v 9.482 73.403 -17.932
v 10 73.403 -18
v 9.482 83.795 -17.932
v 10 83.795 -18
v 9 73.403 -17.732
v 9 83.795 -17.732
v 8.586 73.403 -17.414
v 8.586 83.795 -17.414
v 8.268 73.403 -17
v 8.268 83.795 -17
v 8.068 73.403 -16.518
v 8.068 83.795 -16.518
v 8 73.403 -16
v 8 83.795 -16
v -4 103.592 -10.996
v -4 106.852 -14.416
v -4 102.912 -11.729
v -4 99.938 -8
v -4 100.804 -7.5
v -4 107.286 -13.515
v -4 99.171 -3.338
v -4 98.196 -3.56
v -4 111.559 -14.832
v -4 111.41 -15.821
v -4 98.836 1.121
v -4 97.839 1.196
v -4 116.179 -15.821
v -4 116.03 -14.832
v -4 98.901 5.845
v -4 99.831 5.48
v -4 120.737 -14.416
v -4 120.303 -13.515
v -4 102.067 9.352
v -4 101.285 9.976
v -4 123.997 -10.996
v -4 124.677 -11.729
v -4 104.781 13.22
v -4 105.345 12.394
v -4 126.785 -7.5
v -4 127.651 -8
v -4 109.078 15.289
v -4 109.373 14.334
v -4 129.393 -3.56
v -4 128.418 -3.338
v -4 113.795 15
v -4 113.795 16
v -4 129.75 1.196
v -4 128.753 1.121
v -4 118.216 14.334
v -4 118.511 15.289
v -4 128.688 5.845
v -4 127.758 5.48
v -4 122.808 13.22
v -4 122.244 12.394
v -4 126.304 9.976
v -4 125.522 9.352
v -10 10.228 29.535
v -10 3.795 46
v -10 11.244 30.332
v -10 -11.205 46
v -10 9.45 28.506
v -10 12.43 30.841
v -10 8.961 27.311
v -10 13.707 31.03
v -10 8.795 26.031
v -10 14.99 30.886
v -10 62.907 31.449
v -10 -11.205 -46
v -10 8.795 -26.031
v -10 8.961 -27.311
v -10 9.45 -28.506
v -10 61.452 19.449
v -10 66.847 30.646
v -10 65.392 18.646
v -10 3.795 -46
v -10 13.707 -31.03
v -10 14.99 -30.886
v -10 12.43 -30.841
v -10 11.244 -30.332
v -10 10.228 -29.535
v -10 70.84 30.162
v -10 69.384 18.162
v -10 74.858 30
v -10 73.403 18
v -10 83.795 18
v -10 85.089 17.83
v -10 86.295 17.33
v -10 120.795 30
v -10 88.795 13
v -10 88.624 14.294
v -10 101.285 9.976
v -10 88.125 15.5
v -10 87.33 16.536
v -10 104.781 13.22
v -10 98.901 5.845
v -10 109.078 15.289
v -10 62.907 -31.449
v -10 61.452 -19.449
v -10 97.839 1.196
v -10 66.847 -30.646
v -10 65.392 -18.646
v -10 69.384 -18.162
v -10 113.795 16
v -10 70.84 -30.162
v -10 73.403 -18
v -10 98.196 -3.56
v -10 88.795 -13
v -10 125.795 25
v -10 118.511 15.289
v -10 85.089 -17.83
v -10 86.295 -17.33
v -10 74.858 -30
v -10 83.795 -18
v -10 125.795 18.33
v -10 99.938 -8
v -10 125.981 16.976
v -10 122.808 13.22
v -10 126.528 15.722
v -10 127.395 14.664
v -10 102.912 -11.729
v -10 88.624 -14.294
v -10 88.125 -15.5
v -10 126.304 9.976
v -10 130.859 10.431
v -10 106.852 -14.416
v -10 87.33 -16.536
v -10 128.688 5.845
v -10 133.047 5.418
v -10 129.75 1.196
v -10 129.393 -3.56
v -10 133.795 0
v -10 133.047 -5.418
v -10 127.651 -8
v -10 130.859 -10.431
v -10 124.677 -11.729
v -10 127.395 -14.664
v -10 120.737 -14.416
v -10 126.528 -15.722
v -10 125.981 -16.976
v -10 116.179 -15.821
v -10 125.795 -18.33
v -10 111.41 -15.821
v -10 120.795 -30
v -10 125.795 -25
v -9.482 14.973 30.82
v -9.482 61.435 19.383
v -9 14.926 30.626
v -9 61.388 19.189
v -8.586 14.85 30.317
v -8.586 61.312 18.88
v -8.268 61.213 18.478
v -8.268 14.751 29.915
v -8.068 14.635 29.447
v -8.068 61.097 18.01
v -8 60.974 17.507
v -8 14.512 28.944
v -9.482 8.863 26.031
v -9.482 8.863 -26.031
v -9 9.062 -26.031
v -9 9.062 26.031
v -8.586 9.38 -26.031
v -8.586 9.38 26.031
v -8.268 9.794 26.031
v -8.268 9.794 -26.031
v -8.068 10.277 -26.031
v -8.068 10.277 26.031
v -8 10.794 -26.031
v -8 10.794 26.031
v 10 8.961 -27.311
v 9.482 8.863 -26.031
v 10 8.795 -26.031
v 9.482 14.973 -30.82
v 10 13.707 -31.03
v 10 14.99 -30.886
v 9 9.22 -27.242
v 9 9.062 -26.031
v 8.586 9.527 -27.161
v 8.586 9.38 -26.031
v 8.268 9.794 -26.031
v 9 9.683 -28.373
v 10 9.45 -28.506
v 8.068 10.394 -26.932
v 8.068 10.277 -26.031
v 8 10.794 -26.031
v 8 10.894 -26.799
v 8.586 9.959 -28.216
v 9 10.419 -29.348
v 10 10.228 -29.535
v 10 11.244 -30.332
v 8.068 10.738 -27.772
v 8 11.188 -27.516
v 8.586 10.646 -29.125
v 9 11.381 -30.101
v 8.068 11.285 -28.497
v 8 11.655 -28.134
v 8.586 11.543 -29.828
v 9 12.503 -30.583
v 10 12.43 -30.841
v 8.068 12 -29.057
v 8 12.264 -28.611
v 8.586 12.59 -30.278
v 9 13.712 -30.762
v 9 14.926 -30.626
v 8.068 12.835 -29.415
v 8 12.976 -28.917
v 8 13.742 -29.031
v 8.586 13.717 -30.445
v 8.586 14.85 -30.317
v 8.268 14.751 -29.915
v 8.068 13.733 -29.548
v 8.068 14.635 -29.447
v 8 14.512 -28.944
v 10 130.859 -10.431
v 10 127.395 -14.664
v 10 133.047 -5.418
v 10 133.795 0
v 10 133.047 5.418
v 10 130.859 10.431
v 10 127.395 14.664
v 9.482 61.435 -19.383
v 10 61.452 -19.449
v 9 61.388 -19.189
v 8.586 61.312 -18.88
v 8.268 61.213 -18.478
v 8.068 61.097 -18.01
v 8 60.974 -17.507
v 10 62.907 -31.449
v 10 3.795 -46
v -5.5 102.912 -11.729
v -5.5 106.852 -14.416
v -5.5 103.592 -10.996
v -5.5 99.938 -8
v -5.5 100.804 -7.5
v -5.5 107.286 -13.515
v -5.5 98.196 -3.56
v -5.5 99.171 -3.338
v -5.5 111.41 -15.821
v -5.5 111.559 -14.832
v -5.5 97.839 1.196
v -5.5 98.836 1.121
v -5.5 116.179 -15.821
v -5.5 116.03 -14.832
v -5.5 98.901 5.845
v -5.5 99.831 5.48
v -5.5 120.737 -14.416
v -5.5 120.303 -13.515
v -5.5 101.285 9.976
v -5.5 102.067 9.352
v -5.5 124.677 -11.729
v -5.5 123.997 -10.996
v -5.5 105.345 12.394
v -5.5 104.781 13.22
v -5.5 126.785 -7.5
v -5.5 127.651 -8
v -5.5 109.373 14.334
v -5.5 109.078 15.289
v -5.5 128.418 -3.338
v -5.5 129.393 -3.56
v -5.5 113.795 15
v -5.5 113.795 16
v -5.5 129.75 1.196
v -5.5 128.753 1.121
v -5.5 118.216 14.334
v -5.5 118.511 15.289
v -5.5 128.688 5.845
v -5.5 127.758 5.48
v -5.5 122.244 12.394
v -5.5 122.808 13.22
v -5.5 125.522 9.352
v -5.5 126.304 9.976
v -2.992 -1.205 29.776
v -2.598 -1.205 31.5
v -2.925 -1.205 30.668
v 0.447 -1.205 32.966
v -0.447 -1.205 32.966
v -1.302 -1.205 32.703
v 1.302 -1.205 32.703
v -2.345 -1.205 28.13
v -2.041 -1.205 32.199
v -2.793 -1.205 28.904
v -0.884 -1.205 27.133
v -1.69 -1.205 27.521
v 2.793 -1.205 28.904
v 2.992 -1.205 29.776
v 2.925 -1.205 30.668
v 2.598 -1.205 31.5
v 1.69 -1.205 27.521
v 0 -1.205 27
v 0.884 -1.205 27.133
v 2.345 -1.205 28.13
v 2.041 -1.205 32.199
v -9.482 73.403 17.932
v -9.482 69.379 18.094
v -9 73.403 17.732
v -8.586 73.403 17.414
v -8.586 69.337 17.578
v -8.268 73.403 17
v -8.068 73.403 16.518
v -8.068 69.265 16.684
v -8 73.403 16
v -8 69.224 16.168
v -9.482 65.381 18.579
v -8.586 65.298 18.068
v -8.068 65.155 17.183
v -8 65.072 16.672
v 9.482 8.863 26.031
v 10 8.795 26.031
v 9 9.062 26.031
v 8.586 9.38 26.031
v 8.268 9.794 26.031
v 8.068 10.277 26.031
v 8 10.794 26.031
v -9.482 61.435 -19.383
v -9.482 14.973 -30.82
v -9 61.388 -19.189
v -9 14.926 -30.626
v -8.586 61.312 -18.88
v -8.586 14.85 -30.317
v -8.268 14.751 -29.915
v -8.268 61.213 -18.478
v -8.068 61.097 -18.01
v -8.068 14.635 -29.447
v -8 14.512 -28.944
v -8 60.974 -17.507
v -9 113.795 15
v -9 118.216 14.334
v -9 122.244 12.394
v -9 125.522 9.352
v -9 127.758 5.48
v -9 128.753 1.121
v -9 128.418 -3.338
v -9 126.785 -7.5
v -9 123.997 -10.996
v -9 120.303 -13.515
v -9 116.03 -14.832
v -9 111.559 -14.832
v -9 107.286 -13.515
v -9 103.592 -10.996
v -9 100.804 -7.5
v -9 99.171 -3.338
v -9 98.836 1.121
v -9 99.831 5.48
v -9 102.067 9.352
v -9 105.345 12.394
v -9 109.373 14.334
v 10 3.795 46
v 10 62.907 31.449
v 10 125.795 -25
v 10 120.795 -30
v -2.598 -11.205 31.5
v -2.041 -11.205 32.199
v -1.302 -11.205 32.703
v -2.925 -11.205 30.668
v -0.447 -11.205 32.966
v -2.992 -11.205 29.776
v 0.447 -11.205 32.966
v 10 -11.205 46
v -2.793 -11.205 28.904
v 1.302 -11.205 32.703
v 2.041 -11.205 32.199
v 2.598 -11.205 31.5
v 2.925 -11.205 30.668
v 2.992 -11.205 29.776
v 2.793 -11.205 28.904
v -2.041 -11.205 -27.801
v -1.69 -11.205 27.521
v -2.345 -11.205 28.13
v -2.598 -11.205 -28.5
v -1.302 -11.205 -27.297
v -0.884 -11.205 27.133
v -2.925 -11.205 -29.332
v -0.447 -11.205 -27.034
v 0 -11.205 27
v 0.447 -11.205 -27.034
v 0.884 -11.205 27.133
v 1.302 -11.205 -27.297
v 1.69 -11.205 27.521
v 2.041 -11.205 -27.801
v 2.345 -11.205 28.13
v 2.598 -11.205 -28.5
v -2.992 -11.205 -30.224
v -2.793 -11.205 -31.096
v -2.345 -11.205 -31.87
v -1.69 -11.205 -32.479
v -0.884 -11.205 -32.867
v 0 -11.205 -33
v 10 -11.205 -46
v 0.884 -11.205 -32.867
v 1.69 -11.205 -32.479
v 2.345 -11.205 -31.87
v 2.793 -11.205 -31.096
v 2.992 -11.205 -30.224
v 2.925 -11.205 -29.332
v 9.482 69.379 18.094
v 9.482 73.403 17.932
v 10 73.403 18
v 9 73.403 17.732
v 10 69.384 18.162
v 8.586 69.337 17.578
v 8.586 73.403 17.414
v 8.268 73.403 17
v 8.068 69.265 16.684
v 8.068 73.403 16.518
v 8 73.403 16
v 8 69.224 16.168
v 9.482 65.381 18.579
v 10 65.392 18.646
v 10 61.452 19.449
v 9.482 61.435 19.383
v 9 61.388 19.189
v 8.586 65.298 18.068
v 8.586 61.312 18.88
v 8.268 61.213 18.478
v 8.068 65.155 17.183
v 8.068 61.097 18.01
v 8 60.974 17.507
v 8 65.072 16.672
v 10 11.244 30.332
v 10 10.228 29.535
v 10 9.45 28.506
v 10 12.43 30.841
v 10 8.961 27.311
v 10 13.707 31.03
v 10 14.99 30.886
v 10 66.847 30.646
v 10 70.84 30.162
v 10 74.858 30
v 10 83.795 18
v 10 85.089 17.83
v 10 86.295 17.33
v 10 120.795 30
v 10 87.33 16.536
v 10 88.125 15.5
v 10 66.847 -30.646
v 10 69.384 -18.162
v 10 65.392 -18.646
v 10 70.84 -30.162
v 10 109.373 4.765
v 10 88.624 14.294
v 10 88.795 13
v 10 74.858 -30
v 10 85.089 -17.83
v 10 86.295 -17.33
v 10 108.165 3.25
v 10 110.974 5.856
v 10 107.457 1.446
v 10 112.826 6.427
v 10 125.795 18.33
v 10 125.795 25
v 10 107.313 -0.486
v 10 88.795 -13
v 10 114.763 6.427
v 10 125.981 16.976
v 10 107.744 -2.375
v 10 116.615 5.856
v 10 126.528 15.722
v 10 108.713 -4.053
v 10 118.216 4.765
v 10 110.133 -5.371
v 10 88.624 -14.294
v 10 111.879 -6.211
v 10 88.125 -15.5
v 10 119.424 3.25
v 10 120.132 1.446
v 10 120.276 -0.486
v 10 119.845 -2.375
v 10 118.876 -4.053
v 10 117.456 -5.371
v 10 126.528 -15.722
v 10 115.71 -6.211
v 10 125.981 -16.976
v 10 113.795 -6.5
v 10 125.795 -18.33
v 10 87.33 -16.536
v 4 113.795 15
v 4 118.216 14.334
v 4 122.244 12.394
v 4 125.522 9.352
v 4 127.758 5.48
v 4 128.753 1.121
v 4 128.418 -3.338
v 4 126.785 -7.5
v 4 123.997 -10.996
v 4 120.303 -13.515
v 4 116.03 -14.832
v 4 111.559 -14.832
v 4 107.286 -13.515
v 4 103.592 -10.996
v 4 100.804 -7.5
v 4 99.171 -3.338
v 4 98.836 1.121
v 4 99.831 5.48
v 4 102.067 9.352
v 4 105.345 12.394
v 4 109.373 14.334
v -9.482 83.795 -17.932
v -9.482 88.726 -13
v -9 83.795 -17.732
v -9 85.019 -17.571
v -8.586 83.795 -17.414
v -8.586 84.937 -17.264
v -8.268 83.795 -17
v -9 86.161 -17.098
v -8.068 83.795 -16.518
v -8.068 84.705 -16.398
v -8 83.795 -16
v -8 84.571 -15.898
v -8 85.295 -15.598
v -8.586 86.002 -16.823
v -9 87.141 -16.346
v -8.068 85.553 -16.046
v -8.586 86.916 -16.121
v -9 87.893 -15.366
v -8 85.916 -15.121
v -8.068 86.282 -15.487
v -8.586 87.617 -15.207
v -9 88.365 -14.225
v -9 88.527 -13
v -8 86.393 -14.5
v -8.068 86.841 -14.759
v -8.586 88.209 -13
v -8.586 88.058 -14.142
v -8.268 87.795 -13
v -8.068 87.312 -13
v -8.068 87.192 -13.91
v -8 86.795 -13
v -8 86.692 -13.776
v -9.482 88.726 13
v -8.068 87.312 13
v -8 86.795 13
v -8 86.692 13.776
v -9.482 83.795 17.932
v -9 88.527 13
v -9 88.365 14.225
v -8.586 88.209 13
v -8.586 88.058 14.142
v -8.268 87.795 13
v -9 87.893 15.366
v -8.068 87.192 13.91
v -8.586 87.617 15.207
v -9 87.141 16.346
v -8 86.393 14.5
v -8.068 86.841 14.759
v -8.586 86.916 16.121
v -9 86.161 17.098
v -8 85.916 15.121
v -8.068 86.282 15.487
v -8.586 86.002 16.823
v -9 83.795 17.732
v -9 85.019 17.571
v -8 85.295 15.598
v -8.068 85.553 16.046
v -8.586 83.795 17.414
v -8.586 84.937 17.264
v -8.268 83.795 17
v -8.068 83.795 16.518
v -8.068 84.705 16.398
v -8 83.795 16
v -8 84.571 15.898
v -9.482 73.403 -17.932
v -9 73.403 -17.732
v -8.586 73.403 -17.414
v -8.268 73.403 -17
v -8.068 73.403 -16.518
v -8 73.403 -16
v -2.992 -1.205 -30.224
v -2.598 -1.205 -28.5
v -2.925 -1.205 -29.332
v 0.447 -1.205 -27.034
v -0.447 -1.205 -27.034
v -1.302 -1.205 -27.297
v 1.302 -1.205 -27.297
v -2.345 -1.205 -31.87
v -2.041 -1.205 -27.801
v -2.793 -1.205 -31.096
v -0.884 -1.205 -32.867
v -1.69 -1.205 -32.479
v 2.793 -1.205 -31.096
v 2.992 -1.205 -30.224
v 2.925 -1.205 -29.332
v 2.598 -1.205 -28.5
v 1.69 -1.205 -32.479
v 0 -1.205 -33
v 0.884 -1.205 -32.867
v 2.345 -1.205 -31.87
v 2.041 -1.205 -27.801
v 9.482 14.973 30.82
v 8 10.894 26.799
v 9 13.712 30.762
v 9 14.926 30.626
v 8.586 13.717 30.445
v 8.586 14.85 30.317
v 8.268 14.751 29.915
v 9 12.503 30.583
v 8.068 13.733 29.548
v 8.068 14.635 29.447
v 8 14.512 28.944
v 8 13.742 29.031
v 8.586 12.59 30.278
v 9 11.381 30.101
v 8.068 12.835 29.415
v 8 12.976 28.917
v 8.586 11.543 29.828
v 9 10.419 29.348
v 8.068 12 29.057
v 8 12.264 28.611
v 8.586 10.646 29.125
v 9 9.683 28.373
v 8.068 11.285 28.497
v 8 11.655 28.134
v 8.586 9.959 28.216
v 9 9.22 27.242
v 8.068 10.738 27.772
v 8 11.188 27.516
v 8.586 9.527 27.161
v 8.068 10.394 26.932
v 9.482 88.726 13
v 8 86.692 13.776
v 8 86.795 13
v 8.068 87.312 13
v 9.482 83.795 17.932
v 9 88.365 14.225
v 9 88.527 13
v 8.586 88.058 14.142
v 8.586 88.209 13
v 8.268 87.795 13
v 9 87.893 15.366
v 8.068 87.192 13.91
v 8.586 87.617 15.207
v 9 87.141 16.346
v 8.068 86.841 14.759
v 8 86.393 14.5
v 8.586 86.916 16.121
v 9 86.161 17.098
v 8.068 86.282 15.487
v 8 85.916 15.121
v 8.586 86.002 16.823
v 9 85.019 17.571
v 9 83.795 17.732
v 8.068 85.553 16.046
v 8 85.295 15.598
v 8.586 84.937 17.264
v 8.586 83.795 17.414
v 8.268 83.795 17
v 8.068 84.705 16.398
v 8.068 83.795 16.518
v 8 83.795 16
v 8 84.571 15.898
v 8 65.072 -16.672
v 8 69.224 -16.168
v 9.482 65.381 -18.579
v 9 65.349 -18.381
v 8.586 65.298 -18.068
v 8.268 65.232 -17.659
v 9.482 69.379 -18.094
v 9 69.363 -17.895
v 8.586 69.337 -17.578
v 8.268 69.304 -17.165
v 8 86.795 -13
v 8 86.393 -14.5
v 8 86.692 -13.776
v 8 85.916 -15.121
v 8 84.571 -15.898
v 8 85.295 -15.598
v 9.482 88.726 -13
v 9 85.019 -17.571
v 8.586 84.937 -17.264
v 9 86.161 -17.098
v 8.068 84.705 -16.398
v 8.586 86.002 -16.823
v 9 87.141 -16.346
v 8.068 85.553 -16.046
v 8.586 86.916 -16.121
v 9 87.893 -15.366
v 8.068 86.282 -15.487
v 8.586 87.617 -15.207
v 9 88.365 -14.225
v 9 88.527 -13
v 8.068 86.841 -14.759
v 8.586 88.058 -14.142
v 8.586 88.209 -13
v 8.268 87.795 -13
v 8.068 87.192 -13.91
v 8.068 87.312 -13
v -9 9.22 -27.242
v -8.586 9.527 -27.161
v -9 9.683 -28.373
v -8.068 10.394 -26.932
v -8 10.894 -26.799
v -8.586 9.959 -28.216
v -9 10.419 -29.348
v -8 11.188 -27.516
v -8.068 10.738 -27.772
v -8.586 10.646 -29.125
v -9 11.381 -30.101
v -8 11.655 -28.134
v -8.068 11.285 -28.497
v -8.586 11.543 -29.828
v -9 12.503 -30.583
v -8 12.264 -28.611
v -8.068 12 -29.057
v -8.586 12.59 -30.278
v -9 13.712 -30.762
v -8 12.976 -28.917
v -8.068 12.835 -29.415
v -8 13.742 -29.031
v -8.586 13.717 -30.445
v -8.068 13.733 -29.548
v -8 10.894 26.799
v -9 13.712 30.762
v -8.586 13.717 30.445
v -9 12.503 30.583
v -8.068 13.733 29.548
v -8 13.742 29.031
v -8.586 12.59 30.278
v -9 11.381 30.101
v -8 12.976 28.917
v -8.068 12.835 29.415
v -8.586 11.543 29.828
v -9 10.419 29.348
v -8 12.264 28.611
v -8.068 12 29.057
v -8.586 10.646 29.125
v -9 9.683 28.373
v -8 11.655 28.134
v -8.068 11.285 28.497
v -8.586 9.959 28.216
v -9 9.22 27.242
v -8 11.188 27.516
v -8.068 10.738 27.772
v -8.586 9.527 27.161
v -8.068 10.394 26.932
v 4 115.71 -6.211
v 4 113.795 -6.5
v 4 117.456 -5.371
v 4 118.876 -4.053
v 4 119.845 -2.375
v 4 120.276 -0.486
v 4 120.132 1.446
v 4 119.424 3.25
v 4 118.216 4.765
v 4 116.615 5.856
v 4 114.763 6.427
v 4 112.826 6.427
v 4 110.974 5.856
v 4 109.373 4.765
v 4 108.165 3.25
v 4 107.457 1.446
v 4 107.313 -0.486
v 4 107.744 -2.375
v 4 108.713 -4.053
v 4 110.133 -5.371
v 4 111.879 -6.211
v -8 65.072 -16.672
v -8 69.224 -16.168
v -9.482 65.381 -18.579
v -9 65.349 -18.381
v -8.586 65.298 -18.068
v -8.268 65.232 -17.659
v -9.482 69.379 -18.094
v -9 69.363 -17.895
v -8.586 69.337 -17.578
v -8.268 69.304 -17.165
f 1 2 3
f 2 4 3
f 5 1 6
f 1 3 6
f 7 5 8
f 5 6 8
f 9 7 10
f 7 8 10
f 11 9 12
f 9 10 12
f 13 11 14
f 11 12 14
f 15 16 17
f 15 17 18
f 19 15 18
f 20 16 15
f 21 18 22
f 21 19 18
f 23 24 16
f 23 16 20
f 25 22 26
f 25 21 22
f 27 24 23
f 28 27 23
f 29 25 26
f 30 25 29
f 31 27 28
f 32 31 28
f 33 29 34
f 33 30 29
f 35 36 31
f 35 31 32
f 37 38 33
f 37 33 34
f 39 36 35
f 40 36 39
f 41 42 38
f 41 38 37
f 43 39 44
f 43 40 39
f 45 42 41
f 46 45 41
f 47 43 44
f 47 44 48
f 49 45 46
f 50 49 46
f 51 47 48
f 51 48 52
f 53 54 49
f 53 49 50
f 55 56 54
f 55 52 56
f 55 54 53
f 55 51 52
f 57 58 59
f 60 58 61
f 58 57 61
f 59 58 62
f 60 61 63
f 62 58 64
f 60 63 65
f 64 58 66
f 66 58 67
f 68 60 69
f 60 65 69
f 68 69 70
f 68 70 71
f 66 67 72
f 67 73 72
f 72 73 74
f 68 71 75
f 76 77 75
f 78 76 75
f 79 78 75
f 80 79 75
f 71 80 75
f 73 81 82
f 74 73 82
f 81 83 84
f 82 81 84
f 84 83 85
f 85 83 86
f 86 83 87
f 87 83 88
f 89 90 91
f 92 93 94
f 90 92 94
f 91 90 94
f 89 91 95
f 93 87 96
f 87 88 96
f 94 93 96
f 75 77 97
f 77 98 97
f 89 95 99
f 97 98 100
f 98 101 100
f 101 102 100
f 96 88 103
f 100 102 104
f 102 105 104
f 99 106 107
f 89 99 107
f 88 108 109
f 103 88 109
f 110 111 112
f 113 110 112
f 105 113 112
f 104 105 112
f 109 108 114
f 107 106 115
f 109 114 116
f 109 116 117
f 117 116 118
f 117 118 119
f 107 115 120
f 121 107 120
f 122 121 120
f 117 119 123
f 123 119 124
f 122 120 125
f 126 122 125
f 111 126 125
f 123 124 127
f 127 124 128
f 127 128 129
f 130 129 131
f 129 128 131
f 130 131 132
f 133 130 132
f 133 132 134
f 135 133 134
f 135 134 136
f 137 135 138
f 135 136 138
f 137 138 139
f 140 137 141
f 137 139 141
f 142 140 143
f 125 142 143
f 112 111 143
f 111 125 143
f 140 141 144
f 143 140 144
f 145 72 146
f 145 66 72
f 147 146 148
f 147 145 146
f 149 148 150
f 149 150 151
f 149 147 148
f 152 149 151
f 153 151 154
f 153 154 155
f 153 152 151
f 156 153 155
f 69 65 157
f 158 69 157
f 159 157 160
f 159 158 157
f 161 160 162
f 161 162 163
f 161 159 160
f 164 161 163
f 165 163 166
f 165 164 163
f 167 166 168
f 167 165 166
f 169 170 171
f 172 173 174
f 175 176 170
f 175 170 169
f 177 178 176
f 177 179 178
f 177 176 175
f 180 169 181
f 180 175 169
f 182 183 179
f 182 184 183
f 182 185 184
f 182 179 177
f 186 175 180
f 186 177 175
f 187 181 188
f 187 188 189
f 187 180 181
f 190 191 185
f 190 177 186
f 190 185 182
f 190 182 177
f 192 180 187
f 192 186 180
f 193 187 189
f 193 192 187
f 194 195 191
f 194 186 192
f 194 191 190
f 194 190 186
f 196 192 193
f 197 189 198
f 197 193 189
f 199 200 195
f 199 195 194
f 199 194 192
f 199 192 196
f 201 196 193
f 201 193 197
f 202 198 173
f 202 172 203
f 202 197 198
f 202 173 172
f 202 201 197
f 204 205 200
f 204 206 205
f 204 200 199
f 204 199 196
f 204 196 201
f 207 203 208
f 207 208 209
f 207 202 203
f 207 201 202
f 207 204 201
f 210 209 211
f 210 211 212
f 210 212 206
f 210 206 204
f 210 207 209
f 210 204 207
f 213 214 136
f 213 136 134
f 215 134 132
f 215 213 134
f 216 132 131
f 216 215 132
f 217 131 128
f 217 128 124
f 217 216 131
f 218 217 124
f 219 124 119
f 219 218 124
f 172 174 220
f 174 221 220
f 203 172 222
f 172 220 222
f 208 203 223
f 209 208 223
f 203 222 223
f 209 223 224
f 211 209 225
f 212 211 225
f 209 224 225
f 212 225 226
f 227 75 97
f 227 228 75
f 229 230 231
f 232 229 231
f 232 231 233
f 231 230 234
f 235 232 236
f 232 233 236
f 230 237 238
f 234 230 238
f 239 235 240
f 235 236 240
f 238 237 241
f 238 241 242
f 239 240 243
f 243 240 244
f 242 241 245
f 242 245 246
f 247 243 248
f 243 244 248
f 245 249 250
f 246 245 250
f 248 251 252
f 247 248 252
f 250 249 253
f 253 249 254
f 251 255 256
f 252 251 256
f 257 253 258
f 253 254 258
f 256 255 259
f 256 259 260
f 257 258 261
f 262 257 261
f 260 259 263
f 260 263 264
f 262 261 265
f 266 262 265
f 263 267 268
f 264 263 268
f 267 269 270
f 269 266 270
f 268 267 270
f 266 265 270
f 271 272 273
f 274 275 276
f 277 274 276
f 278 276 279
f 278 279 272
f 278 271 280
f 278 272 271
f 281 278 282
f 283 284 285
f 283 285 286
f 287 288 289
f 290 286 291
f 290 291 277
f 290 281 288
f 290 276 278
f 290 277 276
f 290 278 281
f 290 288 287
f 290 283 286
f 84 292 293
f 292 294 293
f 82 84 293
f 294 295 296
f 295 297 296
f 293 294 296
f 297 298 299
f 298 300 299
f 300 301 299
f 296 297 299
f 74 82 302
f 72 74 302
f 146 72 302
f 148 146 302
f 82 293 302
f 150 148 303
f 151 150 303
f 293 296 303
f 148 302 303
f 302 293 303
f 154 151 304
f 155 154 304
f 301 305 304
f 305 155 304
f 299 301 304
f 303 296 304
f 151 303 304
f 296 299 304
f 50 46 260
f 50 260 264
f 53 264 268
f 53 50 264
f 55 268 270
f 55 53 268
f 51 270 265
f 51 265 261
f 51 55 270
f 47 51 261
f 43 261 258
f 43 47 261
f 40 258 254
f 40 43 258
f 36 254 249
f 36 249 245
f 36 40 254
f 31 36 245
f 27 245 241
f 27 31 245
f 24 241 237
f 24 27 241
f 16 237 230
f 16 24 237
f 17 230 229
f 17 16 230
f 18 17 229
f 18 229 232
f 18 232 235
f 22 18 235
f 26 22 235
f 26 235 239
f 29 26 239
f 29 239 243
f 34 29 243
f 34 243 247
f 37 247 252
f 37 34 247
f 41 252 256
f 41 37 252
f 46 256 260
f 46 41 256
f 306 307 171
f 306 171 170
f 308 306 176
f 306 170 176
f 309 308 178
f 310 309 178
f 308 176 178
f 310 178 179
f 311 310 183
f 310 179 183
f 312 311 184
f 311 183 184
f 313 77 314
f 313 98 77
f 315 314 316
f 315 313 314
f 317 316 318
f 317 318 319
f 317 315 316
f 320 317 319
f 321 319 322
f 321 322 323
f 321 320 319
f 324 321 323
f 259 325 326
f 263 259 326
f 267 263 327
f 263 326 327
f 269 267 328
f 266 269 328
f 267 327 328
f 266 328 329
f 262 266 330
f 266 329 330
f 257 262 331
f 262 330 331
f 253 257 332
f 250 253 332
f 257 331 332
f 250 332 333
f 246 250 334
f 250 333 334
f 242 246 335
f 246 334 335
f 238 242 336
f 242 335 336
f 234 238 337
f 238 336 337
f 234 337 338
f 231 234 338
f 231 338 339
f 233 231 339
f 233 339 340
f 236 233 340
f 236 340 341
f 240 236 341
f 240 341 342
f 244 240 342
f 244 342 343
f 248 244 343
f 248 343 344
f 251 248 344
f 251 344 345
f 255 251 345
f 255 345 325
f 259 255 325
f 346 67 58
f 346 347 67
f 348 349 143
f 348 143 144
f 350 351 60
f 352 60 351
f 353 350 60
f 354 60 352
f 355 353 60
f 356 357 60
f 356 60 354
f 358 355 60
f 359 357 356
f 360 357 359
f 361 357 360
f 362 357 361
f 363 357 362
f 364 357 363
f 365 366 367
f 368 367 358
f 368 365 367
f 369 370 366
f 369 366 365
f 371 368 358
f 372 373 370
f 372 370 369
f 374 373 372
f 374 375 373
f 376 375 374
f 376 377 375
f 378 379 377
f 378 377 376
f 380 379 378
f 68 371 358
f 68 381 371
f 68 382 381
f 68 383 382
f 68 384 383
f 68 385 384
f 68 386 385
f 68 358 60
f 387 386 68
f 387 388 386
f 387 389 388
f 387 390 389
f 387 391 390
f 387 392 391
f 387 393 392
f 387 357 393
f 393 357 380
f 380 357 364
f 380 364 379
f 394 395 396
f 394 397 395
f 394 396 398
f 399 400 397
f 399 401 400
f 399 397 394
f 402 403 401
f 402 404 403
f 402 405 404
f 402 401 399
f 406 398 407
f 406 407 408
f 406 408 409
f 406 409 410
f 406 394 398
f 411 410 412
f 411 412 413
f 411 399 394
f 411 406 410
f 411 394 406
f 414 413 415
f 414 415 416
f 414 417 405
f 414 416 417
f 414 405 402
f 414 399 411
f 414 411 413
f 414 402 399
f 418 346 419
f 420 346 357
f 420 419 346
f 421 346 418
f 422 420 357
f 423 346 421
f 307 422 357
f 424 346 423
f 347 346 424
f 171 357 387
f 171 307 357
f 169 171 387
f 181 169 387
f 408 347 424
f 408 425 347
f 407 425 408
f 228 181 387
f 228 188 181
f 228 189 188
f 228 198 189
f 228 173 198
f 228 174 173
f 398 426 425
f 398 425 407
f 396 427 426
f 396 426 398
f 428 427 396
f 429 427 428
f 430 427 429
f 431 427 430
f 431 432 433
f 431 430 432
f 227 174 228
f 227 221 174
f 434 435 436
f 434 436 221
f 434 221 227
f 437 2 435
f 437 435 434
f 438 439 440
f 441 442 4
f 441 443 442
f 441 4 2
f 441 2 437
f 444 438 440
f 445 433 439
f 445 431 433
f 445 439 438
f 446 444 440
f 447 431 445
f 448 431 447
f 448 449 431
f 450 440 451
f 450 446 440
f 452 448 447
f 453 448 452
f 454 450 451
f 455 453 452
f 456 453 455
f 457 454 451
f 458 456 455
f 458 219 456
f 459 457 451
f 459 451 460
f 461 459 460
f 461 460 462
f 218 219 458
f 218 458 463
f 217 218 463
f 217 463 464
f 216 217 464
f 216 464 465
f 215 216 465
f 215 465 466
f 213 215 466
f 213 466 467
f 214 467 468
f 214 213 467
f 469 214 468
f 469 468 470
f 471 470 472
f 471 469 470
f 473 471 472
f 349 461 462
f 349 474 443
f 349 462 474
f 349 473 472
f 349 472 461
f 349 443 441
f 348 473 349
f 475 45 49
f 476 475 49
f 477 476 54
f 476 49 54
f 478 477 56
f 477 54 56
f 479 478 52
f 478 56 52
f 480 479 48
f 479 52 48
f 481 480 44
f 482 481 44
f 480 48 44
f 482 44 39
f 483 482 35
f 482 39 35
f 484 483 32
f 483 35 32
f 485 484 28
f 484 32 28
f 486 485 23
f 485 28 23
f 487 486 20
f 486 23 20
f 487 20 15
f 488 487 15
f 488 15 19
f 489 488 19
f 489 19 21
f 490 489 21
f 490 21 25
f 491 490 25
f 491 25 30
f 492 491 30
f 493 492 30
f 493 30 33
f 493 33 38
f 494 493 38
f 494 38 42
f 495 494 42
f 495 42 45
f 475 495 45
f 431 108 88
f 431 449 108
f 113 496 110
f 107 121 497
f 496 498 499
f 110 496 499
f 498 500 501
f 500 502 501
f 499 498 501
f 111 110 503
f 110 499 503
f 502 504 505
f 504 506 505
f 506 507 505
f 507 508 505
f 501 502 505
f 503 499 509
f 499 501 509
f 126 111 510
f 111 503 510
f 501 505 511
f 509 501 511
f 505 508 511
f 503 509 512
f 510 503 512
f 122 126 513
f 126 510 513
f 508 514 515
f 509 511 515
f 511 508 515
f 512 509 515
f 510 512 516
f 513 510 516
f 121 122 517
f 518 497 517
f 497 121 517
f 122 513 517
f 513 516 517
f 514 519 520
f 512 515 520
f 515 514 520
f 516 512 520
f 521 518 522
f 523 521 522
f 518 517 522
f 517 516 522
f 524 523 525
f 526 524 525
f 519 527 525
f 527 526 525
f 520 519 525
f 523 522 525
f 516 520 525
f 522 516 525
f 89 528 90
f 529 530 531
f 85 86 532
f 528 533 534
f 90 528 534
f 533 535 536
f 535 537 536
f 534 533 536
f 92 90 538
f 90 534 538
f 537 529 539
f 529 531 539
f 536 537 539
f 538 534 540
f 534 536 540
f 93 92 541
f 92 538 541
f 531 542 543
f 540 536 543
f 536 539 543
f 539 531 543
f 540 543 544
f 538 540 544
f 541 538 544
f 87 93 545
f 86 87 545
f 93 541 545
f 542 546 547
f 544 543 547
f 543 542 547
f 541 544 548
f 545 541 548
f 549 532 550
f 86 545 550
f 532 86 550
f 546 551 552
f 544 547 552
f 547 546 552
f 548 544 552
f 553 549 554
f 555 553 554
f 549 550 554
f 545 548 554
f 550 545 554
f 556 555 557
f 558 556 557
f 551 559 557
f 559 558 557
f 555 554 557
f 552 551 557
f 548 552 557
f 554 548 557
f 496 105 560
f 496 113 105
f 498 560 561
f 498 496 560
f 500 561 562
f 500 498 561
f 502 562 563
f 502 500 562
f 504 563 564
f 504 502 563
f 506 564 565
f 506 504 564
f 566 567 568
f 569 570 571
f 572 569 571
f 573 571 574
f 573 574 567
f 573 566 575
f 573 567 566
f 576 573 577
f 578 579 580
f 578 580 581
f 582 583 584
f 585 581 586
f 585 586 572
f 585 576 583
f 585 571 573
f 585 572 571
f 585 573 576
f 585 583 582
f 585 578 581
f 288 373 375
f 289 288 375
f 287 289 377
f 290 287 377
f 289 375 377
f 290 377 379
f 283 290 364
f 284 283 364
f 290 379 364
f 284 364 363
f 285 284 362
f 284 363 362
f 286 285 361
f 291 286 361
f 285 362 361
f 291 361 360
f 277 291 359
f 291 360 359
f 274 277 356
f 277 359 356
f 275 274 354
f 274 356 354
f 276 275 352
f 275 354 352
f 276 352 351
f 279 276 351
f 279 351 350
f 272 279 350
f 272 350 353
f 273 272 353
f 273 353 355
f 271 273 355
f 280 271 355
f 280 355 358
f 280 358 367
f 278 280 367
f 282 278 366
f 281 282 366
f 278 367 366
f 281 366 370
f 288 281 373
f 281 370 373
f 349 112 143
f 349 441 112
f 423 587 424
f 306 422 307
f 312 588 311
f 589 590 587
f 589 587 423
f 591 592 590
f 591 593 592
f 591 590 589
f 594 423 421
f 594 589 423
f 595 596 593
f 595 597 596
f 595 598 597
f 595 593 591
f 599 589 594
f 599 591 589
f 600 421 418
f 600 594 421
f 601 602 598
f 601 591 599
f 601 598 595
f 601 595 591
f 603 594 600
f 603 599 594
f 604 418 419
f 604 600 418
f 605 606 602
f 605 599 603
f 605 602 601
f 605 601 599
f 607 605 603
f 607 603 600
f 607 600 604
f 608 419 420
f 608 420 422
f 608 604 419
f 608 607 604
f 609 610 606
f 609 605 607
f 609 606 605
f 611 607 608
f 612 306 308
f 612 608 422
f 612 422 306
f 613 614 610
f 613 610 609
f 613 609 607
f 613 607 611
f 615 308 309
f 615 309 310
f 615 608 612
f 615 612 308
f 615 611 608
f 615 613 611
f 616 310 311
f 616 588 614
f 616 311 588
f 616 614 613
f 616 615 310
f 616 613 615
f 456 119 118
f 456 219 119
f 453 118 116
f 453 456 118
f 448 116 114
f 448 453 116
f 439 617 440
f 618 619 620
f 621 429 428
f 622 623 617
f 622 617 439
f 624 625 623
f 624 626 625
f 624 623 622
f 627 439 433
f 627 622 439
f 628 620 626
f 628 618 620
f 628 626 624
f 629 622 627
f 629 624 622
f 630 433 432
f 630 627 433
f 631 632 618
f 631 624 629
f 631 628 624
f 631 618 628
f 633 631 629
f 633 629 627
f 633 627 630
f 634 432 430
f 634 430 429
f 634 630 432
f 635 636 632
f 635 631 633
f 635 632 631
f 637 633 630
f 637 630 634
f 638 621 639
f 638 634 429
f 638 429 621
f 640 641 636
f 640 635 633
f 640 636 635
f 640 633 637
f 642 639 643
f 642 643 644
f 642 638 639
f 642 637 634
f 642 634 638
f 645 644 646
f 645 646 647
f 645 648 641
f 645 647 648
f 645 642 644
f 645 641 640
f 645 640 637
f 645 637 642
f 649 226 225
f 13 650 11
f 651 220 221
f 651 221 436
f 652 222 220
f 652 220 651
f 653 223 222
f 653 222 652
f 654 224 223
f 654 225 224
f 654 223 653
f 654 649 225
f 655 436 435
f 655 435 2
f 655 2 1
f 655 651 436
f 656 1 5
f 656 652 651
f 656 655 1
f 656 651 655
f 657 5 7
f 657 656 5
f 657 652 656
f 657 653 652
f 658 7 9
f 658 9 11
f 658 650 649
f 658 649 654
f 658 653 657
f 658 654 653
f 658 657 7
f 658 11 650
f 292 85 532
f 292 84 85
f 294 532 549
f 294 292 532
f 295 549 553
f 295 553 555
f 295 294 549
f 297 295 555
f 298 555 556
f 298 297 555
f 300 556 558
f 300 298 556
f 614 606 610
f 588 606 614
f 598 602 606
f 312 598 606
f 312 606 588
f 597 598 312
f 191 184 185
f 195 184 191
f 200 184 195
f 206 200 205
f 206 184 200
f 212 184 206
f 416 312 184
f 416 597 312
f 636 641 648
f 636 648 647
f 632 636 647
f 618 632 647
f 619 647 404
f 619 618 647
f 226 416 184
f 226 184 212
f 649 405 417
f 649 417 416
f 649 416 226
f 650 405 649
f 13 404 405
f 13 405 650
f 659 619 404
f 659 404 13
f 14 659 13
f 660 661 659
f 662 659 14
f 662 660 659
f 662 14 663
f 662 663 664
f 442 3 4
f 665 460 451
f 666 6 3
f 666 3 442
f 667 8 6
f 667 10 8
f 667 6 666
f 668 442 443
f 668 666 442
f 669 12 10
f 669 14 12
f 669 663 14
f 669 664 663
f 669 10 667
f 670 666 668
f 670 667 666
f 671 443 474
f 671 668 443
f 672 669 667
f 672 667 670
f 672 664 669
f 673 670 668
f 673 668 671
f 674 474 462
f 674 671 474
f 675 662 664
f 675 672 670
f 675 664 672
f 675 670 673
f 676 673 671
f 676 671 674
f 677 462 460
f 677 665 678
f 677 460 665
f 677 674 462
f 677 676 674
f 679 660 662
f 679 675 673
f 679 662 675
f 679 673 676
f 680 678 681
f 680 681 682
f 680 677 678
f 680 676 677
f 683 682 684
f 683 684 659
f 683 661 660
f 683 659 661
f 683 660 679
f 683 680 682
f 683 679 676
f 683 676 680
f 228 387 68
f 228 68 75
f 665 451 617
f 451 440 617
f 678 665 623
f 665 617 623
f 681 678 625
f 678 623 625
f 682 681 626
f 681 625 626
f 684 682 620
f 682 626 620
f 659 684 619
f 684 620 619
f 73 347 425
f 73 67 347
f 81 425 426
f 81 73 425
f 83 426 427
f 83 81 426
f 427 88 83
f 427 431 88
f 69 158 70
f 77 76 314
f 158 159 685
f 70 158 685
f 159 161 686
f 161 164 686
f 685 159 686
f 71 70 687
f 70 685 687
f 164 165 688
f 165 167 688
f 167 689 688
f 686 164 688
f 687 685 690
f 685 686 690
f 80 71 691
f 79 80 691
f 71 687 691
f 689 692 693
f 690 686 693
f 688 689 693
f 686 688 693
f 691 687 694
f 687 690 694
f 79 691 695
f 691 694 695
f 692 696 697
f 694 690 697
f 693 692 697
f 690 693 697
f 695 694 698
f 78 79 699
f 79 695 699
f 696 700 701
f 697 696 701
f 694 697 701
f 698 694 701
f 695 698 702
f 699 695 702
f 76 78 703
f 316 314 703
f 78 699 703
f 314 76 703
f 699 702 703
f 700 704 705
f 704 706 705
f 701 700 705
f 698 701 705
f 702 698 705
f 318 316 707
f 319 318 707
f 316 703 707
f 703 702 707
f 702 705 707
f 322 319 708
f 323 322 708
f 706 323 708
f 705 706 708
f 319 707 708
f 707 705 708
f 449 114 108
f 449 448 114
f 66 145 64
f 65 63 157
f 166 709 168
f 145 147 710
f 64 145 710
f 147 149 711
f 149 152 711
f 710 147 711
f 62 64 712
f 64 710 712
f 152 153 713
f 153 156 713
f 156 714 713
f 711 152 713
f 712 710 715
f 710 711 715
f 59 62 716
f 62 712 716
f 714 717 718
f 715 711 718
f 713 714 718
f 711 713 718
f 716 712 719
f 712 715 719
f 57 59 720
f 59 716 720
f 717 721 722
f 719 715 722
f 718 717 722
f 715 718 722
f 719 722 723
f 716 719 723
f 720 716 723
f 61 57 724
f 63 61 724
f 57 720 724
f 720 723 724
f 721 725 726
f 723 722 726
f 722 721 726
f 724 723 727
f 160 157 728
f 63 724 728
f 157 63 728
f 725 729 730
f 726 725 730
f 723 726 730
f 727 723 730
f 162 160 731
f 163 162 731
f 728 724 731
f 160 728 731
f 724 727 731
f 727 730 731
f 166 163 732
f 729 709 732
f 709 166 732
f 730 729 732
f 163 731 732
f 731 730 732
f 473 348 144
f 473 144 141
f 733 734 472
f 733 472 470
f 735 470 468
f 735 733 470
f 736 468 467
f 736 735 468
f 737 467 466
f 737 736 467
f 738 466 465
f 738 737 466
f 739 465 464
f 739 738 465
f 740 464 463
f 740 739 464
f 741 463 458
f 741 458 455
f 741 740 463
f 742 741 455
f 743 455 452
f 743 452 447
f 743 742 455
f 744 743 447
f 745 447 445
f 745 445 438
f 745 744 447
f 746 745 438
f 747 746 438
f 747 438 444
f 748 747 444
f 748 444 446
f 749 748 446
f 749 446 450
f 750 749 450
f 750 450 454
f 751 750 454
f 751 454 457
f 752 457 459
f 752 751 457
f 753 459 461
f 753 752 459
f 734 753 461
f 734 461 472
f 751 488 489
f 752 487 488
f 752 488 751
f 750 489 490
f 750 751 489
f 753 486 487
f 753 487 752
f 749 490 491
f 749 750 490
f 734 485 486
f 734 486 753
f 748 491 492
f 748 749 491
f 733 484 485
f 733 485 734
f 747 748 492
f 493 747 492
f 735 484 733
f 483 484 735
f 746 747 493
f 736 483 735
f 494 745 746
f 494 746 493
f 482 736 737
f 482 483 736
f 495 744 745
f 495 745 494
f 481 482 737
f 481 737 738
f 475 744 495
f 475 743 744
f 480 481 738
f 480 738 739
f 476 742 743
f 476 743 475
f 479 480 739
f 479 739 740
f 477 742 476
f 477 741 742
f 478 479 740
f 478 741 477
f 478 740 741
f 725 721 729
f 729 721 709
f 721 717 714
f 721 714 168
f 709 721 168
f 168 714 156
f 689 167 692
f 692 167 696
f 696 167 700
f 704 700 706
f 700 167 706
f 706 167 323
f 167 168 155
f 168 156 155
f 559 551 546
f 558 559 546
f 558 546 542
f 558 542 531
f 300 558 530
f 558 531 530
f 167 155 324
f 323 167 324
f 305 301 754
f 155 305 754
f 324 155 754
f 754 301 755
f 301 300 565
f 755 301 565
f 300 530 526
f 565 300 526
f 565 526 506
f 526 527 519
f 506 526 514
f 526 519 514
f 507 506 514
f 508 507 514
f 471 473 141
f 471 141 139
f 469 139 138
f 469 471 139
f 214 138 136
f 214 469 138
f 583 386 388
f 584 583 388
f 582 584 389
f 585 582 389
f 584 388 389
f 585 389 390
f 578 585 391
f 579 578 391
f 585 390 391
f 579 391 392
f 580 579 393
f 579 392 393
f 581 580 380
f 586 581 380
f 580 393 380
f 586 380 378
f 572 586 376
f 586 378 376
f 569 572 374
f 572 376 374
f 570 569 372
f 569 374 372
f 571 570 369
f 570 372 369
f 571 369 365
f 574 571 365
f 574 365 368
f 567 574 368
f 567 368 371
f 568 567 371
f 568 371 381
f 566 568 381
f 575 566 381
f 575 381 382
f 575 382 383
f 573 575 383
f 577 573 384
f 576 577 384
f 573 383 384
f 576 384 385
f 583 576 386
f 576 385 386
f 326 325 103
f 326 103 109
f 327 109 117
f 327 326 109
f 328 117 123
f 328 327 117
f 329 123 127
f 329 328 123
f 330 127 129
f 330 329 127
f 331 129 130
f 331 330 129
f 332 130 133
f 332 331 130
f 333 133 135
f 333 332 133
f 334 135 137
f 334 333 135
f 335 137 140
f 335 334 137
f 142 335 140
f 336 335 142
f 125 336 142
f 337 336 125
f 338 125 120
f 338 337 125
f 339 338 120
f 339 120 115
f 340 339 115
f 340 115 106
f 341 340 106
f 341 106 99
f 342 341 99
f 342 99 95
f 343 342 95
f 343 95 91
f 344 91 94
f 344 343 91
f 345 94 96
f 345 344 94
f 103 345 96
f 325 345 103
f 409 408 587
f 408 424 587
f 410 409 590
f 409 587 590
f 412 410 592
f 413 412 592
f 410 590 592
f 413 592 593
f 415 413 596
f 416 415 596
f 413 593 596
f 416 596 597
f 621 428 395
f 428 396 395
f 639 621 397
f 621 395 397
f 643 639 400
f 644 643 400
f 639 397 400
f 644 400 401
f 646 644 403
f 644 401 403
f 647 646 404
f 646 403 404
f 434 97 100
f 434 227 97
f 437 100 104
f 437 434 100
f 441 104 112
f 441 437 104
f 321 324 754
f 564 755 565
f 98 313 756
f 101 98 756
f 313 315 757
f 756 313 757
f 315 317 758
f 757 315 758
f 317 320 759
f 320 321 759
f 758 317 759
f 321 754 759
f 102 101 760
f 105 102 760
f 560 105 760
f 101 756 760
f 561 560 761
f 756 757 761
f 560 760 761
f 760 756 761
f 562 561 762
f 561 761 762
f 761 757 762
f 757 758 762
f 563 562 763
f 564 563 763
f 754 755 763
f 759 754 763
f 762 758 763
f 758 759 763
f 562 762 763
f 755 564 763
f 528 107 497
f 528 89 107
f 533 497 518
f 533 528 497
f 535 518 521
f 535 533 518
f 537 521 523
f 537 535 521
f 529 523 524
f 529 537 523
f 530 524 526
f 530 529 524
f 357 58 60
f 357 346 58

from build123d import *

# Parameters (mm, degrees)
SKETCH1_R            = 6.5
BOSS_EXTRUDE1_DEPTH  = 10
CUT_EXTRUDE1_DEPTH   = 2
FILLET1_R            = 2
FILLET1_OF_MIRROR4_R = 2
FILLET2_R            = 50
SKETCH3_R            = 3
CUT_EXTRUDE2_DEPTH   = 10
SKETCH4_R            = 15
CUT_EXTRUDE3_DEPTH   = 14
CHAMFER1_SIZE        = 1
CUT_EXTRUDE4_START   = -6
SKETCH5_R            = 16
CUT_EXTRUDE4_DEPTH   = 1.5


with BuildPart() as part:
    # Sketch1 → Boss-Extrude1 (new, symmetric)
    with BuildSketch(Plane(origin=(0, 0, 0), x_dir=(0, 0, -1), z_dir=(1, 0, 0))):
        with BuildLine():
            Line((-46, -11.205497968), (46, -11.205497968))
            Line((46, -11.205497968), (46, 3.794502032))
            Line((46, 3.794502032), (30, 68.794502032))
            Line((30, 68.794502032), (30, 120.794502032))
            Line((30, 120.794502032), (25, 125.794502032))
            Line((25, 125.794502032), (18.33030278, 125.794502032))
            ThreePointArc((18.33030278, 125.794502032), (16.33030278, 126.211926337), (14.664242224, 127.394502032))
            ThreePointArc((14.664242224, 127.394502032), (0, 133.794502032), (-14.664242224, 127.394502032))
            ThreePointArc((-14.664242224, 127.394502032), (-16.33030278, 126.211926337), (-18.33030278, 125.794502032))
            Line((-18.33030278, 125.794502032), (-25, 125.794502032))
            Line((-25, 125.794502032), (-30, 120.794502032))
            Line((-30, 120.794502032), (-30, 68.794502032))
            Line((-30, 68.794502032), (-46, 3.794502032))
            Line((-46, 3.794502032), (-46, -11.205497968))
        make_face()
        with Locations((0, 113.794502032)):
            Circle(SKETCH1_R, mode=Mode.SUBTRACT)
    extrude(amount=BOSS_EXTRUDE1_DEPTH, both=True)

    # Sketch2 → Cut-Extrude1 (cut, symmetric)
    with BuildSketch(Plane(origin=(10, 0, 0), x_dir=(0, 0, -1), z_dir=(1, 0, 0))):
        with BuildLine():
            Line((13, 88.794502032), (-13, 88.794502032))
            ThreePointArc((-13, 88.794502032), (-16.535533906, 87.330035938), (-18, 83.794502032))
            Line((-18, 83.794502032), (-18, 73.402647758))
            ThreePointArc((-18, 73.402647758), (-18.363636327, 67.383395202), (-19.449256053, 61.451695402))
            Line((-19.449256053, 61.451695402), (-30.886080209, 14.989597267))
            ThreePointArc((-30.886080209, 14.989597267), (-29.966452179, 10.710306527), (-26.031005815, 8.794502032))
            Line((-26.031005815, 8.794502032), (26.031005815, 8.794502032))
            ThreePointArc((26.031005815, 8.794502032), (29.966452179, 10.710306527), (30.886080209, 14.989597267))
            Line((30.886080209, 14.989597267), (19.449256053, 61.451695402))
            ThreePointArc((19.449256053, 61.451695402), (18.363636327, 67.383395202), (18, 73.402647758))
            Line((18, 73.402647758), (18, 83.794502032))
            ThreePointArc((18, 83.794502032), (16.535533906, 87.330035938), (13, 88.794502032))
        make_face()
    cut_extrude1 = extrude(amount=CUT_EXTRUDE1_DEPTH, both=True, mode=Mode.SUBTRACT)

    # Fillet1
    fillet1_edges = [part.edges().sort_by_distance(p)[0] for p in [
        (8, 38.220646335, 25.167668131),
        (8, 67.383395202, 18.363636327),
        (8, 78.598574895, 18),
        (8, 87.330035938, 16.535533906),
        (8, 88.794502032, 0),
        (8, 87.330035938, -16.535533906),
        (8, 78.598574895, -18),
        (8, 67.383395202, -18.363636327),
        (8, 38.220646335, -25.167668131),
        (8, 10.710306527, -29.966452179),
        (8, 8.794502032, 0),
        (8, 10.710306527, 29.966452179),
    ]]
    fillet(fillet1_edges, radius=FILLET1_R - 0.0001)  # a hair under: the kernel refuses the full size

    # Mirror4: Cut-Extrude1 across plane
    add(cut_extrude1.mirror(Plane(origin=(0, 0, 0), x_dir=(0, 0, 1), z_dir=(1, 0, 0))), mode=Mode.SUBTRACT)

    # Fillet1 of Mirror4
    fillet1_of_mirror4_edges = [part.edges().sort_by_distance(p)[0] for p in [
        (-8, 38.220646335, 25.167668131),
        (-8, 67.383395202, 18.363636327),
        (-8, 78.598574895, 18),
        (-8, 87.330035938, 16.535533906),
        (-8, 88.794502032, 0),
        (-8, 87.330035938, -16.535533906),
        (-8, 78.598574895, -18),
        (-8, 67.383395202, -18.363636327),
        (-8, 38.220646335, -25.167668131),
        (-8, 10.710306527, -29.966452179),
        (-8, 8.794502032, 0),
        (-8, 10.710306527, 29.966452179),
    ]]
    fillet(fillet1_of_mirror4_edges, radius=FILLET1_OF_MIRROR4_R - 0.0001)  # a hair under: the kernel refuses the full size

    # Fillet2
    fillet2_edges = [part.edges().sort_by_distance(p)[0] for p in [
        (0, 68.794502032, 30),
        (0, 68.794502032, -30),
    ]]
    fillet(fillet2_edges, radius=FILLET2_R)

    # Sketch3 → Cut-Extrude2 (cut)
    with BuildSketch(Plane.XZ.offset(11.205497968)):
        with Locations(Location((0, 30, 0), (0, 0, 270))):
            Circle(SKETCH3_R)
        with Locations(Location((0, -30, 0), (0, 0, 270))):
            Circle(SKETCH3_R)
    extrude(amount=-CUT_EXTRUDE2_DEPTH, mode=Mode.SUBTRACT)

    # Sketch4 → Cut-Extrude3 (cut)
    with BuildSketch(Plane.ZY.offset(10)):
        with Locations((0, 113.794502032)):
            Circle(SKETCH4_R)
    extrude(amount=-CUT_EXTRUDE3_DEPTH, mode=Mode.SUBTRACT)

    # Chamfer1
    chamfer1_edges = [part.edges().sort_by_distance(p)[0] for p in [
        (-10, 113.794502032, -15),
    ]]
    chamfer(chamfer1_edges, length=CHAMFER1_SIZE)

    # Sketch5 → Cut-Extrude4 (cut)
    with BuildSketch(Plane.ZY.offset(10).offset(CUT_EXTRUDE4_START)):
        with Locations((0, 113.794502032)):
            Circle(SKETCH5_R)
    extrude(amount=CUT_EXTRUDE4_DEPTH, mode=Mode.SUBTRACT)


solid = part.part
